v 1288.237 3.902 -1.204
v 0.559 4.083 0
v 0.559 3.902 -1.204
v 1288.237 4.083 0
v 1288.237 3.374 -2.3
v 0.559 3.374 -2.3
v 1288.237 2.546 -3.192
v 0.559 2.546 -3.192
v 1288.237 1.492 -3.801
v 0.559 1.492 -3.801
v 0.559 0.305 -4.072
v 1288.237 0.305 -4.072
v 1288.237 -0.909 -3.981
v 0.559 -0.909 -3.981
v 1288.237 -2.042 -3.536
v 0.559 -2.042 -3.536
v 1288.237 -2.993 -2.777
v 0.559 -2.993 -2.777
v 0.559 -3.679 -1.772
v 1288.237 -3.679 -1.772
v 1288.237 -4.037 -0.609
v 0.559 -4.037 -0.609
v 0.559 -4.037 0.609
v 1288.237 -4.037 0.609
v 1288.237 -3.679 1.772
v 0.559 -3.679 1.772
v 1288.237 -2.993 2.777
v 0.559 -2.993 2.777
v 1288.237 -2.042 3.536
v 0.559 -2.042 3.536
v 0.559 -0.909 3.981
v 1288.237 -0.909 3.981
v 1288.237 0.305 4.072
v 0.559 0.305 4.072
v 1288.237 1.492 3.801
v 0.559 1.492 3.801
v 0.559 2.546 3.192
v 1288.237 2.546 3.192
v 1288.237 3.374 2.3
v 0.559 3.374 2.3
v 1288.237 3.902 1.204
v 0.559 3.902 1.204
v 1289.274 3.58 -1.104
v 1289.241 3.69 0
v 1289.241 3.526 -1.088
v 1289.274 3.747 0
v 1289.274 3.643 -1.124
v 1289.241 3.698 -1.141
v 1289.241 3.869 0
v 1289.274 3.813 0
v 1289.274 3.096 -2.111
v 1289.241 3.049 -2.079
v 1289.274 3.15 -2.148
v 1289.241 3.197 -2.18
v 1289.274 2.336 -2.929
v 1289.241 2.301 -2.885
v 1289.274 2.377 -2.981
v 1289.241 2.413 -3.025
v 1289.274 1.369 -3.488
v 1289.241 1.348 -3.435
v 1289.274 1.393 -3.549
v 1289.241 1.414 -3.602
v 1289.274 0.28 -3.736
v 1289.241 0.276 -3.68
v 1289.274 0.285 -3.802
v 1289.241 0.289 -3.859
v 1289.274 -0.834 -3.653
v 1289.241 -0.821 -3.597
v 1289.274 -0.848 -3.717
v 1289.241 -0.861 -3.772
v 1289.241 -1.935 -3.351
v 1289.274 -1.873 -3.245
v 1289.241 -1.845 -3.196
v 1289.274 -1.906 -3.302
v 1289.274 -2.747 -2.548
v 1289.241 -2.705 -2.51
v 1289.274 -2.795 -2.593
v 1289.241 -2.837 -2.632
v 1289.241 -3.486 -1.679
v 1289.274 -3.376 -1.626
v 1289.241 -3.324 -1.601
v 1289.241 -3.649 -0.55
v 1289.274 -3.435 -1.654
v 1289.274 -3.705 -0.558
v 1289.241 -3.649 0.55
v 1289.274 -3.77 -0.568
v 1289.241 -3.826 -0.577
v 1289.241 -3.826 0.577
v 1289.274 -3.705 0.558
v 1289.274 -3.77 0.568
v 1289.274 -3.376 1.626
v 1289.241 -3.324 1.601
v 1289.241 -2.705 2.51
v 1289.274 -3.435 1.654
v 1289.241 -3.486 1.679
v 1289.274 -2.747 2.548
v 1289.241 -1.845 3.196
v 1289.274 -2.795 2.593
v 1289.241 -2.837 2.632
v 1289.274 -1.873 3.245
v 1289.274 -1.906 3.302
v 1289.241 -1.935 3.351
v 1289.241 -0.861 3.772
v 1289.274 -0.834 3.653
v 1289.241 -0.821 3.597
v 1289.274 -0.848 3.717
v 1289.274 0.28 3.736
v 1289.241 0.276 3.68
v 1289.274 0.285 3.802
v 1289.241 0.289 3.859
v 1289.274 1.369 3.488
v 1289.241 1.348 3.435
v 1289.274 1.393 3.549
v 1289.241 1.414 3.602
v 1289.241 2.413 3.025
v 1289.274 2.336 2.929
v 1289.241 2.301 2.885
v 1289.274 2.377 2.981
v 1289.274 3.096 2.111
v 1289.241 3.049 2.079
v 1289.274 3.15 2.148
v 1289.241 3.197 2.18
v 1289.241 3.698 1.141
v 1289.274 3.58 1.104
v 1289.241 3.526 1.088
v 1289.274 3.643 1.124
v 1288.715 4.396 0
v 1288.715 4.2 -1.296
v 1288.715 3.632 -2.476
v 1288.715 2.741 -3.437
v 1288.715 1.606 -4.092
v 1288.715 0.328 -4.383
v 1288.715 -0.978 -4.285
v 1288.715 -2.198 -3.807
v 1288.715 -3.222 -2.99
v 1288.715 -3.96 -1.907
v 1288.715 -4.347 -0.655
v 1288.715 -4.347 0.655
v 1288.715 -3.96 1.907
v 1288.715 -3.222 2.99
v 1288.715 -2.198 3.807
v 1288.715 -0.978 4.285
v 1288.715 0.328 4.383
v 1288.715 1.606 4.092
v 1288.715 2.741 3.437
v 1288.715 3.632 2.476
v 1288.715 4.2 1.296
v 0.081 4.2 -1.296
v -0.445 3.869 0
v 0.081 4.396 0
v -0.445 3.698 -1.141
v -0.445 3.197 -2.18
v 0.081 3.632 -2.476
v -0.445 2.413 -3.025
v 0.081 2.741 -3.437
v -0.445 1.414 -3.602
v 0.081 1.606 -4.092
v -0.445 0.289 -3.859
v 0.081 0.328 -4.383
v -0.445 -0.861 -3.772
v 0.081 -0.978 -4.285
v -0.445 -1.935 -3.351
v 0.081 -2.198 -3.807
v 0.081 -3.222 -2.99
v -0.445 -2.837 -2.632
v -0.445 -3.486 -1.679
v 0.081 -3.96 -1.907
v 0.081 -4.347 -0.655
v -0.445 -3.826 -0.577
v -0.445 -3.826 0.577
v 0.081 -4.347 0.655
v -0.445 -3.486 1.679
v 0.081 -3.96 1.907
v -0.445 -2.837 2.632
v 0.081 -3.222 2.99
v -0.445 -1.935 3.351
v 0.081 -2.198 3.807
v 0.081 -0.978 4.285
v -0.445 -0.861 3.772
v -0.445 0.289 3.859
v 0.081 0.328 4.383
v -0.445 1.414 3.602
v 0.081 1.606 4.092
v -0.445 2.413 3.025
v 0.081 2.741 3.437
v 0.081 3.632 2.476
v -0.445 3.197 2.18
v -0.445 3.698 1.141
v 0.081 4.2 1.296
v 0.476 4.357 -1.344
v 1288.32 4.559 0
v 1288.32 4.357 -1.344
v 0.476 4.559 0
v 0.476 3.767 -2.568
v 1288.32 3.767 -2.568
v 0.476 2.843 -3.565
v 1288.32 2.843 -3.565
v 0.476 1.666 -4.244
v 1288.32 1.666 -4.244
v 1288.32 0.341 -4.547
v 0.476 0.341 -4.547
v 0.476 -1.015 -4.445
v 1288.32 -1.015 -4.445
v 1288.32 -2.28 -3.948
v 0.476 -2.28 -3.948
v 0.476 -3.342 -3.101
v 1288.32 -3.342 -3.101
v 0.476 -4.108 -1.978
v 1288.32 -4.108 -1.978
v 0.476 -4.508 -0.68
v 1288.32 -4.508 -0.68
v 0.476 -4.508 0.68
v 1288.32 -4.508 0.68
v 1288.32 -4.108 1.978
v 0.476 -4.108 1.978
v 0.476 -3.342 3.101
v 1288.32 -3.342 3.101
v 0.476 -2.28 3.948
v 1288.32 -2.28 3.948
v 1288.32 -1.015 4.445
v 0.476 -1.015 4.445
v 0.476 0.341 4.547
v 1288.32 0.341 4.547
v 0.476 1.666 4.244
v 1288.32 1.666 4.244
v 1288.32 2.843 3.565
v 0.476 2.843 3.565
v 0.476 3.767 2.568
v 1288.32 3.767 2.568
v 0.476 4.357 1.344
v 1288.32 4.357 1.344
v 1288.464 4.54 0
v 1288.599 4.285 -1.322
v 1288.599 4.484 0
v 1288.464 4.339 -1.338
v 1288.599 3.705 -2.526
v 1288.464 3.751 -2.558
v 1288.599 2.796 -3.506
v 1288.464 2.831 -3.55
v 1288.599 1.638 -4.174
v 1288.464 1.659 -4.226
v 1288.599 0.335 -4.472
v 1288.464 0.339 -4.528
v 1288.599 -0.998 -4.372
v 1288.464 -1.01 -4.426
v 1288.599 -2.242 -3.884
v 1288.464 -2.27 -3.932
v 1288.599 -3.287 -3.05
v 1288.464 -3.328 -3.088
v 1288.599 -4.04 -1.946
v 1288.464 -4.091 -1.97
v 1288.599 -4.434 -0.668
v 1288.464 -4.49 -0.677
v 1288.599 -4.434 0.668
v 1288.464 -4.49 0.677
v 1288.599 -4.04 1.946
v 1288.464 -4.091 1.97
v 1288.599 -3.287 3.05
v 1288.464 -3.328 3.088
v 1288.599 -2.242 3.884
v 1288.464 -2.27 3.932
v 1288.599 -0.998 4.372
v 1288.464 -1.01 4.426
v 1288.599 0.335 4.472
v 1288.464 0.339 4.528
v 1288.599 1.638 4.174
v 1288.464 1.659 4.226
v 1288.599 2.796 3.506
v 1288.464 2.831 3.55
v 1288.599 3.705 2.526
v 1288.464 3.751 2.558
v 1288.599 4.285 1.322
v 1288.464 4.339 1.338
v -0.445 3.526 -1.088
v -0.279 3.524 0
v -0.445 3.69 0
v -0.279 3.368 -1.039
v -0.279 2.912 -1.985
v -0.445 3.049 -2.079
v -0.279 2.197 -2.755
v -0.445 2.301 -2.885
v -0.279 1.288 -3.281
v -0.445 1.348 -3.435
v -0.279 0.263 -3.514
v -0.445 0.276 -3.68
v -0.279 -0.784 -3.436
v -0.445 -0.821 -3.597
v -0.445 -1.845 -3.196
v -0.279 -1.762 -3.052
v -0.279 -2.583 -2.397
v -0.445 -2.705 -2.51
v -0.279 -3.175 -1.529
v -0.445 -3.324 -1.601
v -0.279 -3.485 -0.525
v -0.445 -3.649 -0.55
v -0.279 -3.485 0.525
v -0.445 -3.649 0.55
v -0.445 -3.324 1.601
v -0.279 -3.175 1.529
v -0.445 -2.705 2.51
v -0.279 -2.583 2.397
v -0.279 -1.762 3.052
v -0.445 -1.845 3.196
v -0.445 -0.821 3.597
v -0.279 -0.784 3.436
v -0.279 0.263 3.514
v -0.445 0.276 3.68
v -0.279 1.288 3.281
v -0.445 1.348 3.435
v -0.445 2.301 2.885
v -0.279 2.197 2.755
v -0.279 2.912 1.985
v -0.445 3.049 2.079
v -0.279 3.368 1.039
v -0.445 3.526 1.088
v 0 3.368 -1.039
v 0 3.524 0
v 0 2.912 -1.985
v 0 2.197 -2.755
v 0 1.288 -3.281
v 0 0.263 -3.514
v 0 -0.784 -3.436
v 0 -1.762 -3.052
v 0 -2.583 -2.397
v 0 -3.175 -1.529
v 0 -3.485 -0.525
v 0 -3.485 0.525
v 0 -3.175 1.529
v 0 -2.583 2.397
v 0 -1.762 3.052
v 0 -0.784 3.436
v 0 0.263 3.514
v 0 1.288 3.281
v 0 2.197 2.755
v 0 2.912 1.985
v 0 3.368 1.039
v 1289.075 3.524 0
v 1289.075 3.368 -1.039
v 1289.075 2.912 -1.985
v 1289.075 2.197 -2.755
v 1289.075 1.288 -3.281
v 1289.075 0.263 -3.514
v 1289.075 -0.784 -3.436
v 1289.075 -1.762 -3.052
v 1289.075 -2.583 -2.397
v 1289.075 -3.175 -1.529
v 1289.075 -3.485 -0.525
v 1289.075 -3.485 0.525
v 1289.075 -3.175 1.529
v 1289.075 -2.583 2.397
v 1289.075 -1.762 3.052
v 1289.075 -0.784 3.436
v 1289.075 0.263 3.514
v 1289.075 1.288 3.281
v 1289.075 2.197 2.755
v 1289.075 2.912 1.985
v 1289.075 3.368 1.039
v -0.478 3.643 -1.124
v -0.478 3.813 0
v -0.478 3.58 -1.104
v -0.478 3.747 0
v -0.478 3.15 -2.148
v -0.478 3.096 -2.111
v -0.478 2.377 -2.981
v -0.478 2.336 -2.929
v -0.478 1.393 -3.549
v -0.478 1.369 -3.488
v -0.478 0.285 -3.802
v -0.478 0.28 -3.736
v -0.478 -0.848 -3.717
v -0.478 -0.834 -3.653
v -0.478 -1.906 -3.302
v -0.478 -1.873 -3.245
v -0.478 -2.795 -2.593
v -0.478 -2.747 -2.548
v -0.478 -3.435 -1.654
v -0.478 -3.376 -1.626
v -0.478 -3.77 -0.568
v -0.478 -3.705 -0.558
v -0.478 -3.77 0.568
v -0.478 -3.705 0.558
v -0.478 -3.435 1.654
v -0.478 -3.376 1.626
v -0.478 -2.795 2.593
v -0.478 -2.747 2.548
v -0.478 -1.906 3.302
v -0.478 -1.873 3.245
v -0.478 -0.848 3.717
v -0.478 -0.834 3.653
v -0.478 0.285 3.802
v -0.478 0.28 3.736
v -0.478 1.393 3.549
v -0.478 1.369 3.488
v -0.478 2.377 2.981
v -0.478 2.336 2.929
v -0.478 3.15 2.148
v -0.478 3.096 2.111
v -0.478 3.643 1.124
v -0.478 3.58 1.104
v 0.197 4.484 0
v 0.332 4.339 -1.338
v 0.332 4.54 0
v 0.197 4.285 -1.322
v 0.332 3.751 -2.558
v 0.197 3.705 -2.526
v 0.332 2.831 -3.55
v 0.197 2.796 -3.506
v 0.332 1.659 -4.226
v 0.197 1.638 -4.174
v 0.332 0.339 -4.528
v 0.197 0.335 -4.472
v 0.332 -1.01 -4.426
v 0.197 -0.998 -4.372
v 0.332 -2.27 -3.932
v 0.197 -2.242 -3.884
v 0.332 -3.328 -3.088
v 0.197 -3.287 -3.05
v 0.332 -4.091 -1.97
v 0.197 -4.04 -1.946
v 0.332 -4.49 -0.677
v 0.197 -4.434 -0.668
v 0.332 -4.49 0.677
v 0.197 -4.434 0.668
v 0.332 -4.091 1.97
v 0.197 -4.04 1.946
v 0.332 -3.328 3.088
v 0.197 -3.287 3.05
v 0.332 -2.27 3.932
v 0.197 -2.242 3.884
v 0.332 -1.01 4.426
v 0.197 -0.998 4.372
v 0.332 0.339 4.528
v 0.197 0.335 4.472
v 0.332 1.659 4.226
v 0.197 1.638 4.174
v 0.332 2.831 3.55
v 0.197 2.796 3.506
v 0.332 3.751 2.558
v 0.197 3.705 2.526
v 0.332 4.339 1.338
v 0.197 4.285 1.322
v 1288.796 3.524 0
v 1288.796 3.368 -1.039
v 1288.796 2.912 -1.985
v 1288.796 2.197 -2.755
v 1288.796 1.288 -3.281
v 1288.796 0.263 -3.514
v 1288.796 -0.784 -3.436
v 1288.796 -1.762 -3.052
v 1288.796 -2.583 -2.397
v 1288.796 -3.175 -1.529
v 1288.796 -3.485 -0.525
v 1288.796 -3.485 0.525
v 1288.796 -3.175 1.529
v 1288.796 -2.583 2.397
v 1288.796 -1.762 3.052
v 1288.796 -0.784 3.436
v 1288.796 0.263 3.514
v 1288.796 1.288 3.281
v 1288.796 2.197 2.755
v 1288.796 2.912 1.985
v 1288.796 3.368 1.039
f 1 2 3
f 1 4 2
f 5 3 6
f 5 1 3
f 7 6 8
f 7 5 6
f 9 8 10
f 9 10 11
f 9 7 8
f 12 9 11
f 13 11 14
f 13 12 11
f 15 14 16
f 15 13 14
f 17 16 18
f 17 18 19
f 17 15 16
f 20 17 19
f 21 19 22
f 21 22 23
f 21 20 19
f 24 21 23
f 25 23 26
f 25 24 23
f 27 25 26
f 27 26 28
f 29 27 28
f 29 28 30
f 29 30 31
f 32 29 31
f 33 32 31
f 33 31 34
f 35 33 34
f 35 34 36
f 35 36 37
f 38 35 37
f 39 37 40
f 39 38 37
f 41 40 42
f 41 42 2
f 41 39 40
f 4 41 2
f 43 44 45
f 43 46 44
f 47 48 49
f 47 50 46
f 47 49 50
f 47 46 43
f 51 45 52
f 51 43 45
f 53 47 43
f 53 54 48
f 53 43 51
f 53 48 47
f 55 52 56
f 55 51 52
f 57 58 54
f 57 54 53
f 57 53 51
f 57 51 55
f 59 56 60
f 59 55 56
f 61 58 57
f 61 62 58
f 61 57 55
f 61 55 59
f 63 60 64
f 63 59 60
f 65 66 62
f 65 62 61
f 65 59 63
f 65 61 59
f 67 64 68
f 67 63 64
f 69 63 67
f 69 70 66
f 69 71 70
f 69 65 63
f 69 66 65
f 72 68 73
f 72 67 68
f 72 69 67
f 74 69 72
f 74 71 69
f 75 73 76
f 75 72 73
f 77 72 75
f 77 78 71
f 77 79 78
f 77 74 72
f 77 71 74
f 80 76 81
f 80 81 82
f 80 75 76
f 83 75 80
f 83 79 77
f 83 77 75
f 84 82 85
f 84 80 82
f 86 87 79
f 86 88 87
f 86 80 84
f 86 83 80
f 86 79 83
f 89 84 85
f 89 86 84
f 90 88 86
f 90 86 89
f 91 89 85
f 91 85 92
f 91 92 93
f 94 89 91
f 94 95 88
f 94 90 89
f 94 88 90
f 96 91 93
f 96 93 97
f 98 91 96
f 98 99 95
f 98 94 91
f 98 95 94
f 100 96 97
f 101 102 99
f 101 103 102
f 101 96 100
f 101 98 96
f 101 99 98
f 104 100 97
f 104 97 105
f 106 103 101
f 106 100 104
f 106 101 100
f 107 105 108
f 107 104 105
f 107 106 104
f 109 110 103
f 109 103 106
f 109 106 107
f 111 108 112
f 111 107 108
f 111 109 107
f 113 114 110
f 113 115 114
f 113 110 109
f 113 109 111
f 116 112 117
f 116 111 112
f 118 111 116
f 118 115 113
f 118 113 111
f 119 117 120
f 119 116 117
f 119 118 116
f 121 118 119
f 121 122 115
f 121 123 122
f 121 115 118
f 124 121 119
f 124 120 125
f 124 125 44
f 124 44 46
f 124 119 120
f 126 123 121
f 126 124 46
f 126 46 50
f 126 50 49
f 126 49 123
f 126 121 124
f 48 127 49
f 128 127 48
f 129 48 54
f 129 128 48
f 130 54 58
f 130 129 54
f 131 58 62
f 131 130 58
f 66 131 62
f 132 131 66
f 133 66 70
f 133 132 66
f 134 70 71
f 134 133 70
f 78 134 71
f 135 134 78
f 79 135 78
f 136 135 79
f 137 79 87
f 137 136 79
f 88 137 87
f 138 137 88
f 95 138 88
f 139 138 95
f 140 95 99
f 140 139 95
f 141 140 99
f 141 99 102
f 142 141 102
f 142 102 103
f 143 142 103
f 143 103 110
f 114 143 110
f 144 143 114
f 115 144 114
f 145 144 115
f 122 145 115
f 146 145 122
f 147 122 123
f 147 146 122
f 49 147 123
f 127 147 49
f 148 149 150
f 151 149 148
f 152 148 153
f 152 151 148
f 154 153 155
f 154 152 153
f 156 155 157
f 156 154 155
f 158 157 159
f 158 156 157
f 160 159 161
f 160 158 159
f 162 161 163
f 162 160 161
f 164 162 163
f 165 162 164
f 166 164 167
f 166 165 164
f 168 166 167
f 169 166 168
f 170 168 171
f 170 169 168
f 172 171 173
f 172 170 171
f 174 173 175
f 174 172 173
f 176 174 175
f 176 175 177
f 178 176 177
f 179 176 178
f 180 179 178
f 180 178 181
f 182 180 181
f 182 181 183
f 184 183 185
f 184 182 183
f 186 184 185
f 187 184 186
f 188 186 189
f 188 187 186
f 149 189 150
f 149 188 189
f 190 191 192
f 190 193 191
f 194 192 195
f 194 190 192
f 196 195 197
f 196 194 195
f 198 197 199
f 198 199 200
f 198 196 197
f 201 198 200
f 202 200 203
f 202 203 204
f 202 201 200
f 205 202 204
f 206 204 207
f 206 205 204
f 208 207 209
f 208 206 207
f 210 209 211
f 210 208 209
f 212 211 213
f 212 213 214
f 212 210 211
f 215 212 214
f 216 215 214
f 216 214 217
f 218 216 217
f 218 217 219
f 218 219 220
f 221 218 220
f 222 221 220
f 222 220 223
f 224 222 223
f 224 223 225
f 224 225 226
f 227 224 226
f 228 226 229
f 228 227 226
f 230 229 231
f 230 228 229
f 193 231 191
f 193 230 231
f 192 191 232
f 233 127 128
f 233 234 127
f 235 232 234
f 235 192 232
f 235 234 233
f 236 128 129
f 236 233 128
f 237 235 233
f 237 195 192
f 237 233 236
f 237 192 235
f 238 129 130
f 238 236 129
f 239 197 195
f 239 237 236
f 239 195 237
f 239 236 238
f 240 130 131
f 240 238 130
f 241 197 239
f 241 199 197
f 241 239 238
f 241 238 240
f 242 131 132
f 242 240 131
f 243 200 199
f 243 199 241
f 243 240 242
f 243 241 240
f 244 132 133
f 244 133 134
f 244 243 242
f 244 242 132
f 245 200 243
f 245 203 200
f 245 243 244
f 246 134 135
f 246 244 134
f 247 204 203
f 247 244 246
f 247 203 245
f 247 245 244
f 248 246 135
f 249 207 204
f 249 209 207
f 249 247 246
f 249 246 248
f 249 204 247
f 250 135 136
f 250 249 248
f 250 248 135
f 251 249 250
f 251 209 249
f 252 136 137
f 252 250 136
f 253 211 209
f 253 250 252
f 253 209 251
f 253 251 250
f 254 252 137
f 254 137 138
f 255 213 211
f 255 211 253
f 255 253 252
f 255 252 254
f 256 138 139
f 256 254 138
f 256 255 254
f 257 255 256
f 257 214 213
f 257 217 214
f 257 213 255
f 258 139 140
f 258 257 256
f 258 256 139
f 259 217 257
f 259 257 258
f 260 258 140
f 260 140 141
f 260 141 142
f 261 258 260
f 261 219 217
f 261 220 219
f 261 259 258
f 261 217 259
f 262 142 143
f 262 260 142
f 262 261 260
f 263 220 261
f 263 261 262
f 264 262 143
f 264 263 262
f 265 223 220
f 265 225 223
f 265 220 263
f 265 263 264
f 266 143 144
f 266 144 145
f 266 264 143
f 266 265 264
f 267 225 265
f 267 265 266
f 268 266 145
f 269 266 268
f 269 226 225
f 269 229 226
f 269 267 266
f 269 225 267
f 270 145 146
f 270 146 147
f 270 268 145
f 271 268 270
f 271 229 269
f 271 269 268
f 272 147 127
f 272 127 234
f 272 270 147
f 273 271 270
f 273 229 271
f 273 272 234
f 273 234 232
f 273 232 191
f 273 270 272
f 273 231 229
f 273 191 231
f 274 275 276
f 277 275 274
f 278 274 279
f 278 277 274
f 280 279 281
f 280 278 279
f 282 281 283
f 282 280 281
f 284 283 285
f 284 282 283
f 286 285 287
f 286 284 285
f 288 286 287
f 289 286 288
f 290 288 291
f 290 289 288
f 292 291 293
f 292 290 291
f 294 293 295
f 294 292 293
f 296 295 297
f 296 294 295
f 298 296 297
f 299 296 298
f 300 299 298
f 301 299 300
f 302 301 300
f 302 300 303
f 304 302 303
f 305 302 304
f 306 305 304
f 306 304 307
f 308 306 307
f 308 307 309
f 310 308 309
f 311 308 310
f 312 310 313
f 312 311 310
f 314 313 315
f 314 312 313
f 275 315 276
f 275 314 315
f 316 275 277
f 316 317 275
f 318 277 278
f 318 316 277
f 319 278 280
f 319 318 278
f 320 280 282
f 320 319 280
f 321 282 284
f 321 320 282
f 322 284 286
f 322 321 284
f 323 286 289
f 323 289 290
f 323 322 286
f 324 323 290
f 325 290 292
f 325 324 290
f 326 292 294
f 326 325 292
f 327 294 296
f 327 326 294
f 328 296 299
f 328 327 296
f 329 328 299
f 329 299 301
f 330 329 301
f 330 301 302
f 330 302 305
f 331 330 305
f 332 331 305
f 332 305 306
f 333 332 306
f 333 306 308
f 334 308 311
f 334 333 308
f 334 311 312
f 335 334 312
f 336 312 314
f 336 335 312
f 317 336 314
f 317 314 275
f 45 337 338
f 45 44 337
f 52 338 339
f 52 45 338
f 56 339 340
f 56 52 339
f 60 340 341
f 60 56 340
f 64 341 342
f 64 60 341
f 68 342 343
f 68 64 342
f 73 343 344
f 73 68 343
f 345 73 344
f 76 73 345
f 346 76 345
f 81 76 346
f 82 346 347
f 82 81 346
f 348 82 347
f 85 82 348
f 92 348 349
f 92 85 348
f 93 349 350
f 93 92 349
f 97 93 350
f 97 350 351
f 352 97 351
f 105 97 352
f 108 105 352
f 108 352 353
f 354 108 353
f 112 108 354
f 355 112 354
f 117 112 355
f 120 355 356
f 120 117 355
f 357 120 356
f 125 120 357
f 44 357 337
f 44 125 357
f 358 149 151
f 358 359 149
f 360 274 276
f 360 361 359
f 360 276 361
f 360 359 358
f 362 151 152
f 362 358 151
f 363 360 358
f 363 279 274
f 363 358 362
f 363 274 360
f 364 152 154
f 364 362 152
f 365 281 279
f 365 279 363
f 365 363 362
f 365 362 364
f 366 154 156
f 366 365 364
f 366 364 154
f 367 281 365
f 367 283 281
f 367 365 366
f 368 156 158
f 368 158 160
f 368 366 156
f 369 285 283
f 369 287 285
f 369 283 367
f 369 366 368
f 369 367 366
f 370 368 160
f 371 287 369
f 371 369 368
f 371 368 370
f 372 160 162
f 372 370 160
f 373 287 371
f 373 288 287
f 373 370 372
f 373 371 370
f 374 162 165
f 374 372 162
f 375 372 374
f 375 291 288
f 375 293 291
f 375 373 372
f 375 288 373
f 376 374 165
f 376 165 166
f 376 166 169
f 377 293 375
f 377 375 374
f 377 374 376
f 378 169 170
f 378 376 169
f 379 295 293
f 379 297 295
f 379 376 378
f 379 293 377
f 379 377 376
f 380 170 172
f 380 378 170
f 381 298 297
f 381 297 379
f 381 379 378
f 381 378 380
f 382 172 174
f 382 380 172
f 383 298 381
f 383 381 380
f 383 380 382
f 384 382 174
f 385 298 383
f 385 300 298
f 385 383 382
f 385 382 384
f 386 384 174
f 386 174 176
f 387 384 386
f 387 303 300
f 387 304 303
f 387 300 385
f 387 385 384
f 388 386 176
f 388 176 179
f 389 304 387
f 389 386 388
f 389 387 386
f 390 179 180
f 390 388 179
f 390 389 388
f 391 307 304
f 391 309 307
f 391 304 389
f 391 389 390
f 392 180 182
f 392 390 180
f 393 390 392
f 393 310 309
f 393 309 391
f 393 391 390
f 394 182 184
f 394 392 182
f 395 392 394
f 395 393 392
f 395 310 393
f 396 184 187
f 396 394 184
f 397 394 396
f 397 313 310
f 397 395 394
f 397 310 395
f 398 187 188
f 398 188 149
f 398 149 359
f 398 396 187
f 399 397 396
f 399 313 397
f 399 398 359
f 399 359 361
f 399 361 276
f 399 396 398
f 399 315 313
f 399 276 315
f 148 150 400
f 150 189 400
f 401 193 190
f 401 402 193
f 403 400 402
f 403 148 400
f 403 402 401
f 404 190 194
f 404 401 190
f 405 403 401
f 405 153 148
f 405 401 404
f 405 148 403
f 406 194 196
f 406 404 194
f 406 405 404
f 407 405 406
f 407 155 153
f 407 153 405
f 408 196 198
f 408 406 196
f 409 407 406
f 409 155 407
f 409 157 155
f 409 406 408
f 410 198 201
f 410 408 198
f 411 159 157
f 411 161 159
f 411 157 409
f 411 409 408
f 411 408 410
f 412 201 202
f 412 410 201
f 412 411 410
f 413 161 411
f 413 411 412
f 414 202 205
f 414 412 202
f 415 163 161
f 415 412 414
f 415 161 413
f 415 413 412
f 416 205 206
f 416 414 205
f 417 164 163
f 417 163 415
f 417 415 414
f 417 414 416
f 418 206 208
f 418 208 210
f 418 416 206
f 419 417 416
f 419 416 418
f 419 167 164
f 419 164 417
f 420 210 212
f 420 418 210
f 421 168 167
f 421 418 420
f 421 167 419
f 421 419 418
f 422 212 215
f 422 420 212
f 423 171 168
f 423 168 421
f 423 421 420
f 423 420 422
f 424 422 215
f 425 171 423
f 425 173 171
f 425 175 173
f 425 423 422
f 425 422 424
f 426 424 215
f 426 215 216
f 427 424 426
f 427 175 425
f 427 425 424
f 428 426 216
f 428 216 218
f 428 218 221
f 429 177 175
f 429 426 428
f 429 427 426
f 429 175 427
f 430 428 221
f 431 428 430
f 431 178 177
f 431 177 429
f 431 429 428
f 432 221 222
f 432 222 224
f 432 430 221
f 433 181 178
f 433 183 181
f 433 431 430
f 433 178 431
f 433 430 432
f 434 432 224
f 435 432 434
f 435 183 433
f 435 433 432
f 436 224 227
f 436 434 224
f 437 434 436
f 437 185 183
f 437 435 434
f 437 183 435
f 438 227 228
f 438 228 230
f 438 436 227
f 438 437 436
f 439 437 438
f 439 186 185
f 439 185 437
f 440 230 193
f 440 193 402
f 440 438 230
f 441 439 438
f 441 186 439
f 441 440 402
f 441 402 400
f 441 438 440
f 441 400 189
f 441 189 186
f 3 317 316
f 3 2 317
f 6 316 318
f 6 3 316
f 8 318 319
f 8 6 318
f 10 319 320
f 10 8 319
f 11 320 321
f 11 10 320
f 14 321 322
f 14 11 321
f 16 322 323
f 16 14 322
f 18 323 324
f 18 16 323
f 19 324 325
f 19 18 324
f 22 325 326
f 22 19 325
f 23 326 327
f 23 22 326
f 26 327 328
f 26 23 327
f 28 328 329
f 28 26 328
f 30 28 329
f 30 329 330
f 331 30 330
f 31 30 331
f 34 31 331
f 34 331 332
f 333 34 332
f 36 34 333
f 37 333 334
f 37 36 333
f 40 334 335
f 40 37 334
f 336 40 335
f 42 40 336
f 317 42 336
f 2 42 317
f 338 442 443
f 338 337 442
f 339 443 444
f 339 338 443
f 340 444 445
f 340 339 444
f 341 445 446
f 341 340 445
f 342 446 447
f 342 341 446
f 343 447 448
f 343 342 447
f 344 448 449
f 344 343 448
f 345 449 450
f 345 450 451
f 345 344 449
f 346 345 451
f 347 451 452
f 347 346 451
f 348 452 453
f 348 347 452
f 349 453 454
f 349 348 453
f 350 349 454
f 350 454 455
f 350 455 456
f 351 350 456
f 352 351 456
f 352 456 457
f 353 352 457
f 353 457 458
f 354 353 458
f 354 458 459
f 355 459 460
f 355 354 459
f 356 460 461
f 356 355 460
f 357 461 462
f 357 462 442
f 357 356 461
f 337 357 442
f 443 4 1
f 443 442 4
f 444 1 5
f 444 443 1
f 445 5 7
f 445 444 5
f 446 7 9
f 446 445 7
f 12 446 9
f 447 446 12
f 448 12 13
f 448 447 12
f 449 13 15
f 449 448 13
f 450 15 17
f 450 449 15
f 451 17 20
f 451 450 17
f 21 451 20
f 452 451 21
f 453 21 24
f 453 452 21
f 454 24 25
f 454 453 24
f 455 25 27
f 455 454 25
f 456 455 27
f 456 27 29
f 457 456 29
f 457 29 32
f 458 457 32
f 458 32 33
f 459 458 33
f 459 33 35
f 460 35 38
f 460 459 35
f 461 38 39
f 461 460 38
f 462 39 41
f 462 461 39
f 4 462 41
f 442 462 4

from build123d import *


with BuildPart() as part:
    # Sketch1 → Revolve1 (revolve)
    with BuildSketch(Plane.XY):
        with BuildLine():
            Line((-0.445028708, 3.689878708), (-0.2794, 3.52425))
            Line((-0.2794, 3.52425), (0, 3.52425))
            Line((0, 3.52425), (0.5588, 4.08305))
            Line((0.5588, 4.08305), (1288.2372, 4.08305))
            Line((1288.2372, 4.08305), (1288.796, 3.52425))
            Line((1288.796, 3.52425), (1289.0754, 3.52425))
            Line((1289.0754, 3.52425), (1289.241028708, 3.689878708))
            ThreePointArc((1289.241028708, 3.689878708), (1289.278226147, 3.779681269), (1289.241028708, 3.869483831))
            Line((1289.241028708, 3.869483831), (1288.714881269, 4.395631269))
            ThreePointArc((1288.714881269, 4.395631269), (1288.533593502, 4.516763883), (1288.31975, 4.5593))
            Line((1288.31975, 4.5593), (0.47625, 4.5593))
            ThreePointArc((0.47625, 4.5593), (0.262406498, 4.516763883), (0.081118731, 4.395631269))
            Line((0.081118731, 4.395631269), (-0.445028708, 3.869483831))
            ThreePointArc((-0.445028708, 3.869483831), (-0.482226147, 3.779681269), (-0.445028708, 3.689878708))
        make_face()
    revolve(axis=Axis((1288.796, 0, 0), (-1, 0, 0)))


solid = part.part
